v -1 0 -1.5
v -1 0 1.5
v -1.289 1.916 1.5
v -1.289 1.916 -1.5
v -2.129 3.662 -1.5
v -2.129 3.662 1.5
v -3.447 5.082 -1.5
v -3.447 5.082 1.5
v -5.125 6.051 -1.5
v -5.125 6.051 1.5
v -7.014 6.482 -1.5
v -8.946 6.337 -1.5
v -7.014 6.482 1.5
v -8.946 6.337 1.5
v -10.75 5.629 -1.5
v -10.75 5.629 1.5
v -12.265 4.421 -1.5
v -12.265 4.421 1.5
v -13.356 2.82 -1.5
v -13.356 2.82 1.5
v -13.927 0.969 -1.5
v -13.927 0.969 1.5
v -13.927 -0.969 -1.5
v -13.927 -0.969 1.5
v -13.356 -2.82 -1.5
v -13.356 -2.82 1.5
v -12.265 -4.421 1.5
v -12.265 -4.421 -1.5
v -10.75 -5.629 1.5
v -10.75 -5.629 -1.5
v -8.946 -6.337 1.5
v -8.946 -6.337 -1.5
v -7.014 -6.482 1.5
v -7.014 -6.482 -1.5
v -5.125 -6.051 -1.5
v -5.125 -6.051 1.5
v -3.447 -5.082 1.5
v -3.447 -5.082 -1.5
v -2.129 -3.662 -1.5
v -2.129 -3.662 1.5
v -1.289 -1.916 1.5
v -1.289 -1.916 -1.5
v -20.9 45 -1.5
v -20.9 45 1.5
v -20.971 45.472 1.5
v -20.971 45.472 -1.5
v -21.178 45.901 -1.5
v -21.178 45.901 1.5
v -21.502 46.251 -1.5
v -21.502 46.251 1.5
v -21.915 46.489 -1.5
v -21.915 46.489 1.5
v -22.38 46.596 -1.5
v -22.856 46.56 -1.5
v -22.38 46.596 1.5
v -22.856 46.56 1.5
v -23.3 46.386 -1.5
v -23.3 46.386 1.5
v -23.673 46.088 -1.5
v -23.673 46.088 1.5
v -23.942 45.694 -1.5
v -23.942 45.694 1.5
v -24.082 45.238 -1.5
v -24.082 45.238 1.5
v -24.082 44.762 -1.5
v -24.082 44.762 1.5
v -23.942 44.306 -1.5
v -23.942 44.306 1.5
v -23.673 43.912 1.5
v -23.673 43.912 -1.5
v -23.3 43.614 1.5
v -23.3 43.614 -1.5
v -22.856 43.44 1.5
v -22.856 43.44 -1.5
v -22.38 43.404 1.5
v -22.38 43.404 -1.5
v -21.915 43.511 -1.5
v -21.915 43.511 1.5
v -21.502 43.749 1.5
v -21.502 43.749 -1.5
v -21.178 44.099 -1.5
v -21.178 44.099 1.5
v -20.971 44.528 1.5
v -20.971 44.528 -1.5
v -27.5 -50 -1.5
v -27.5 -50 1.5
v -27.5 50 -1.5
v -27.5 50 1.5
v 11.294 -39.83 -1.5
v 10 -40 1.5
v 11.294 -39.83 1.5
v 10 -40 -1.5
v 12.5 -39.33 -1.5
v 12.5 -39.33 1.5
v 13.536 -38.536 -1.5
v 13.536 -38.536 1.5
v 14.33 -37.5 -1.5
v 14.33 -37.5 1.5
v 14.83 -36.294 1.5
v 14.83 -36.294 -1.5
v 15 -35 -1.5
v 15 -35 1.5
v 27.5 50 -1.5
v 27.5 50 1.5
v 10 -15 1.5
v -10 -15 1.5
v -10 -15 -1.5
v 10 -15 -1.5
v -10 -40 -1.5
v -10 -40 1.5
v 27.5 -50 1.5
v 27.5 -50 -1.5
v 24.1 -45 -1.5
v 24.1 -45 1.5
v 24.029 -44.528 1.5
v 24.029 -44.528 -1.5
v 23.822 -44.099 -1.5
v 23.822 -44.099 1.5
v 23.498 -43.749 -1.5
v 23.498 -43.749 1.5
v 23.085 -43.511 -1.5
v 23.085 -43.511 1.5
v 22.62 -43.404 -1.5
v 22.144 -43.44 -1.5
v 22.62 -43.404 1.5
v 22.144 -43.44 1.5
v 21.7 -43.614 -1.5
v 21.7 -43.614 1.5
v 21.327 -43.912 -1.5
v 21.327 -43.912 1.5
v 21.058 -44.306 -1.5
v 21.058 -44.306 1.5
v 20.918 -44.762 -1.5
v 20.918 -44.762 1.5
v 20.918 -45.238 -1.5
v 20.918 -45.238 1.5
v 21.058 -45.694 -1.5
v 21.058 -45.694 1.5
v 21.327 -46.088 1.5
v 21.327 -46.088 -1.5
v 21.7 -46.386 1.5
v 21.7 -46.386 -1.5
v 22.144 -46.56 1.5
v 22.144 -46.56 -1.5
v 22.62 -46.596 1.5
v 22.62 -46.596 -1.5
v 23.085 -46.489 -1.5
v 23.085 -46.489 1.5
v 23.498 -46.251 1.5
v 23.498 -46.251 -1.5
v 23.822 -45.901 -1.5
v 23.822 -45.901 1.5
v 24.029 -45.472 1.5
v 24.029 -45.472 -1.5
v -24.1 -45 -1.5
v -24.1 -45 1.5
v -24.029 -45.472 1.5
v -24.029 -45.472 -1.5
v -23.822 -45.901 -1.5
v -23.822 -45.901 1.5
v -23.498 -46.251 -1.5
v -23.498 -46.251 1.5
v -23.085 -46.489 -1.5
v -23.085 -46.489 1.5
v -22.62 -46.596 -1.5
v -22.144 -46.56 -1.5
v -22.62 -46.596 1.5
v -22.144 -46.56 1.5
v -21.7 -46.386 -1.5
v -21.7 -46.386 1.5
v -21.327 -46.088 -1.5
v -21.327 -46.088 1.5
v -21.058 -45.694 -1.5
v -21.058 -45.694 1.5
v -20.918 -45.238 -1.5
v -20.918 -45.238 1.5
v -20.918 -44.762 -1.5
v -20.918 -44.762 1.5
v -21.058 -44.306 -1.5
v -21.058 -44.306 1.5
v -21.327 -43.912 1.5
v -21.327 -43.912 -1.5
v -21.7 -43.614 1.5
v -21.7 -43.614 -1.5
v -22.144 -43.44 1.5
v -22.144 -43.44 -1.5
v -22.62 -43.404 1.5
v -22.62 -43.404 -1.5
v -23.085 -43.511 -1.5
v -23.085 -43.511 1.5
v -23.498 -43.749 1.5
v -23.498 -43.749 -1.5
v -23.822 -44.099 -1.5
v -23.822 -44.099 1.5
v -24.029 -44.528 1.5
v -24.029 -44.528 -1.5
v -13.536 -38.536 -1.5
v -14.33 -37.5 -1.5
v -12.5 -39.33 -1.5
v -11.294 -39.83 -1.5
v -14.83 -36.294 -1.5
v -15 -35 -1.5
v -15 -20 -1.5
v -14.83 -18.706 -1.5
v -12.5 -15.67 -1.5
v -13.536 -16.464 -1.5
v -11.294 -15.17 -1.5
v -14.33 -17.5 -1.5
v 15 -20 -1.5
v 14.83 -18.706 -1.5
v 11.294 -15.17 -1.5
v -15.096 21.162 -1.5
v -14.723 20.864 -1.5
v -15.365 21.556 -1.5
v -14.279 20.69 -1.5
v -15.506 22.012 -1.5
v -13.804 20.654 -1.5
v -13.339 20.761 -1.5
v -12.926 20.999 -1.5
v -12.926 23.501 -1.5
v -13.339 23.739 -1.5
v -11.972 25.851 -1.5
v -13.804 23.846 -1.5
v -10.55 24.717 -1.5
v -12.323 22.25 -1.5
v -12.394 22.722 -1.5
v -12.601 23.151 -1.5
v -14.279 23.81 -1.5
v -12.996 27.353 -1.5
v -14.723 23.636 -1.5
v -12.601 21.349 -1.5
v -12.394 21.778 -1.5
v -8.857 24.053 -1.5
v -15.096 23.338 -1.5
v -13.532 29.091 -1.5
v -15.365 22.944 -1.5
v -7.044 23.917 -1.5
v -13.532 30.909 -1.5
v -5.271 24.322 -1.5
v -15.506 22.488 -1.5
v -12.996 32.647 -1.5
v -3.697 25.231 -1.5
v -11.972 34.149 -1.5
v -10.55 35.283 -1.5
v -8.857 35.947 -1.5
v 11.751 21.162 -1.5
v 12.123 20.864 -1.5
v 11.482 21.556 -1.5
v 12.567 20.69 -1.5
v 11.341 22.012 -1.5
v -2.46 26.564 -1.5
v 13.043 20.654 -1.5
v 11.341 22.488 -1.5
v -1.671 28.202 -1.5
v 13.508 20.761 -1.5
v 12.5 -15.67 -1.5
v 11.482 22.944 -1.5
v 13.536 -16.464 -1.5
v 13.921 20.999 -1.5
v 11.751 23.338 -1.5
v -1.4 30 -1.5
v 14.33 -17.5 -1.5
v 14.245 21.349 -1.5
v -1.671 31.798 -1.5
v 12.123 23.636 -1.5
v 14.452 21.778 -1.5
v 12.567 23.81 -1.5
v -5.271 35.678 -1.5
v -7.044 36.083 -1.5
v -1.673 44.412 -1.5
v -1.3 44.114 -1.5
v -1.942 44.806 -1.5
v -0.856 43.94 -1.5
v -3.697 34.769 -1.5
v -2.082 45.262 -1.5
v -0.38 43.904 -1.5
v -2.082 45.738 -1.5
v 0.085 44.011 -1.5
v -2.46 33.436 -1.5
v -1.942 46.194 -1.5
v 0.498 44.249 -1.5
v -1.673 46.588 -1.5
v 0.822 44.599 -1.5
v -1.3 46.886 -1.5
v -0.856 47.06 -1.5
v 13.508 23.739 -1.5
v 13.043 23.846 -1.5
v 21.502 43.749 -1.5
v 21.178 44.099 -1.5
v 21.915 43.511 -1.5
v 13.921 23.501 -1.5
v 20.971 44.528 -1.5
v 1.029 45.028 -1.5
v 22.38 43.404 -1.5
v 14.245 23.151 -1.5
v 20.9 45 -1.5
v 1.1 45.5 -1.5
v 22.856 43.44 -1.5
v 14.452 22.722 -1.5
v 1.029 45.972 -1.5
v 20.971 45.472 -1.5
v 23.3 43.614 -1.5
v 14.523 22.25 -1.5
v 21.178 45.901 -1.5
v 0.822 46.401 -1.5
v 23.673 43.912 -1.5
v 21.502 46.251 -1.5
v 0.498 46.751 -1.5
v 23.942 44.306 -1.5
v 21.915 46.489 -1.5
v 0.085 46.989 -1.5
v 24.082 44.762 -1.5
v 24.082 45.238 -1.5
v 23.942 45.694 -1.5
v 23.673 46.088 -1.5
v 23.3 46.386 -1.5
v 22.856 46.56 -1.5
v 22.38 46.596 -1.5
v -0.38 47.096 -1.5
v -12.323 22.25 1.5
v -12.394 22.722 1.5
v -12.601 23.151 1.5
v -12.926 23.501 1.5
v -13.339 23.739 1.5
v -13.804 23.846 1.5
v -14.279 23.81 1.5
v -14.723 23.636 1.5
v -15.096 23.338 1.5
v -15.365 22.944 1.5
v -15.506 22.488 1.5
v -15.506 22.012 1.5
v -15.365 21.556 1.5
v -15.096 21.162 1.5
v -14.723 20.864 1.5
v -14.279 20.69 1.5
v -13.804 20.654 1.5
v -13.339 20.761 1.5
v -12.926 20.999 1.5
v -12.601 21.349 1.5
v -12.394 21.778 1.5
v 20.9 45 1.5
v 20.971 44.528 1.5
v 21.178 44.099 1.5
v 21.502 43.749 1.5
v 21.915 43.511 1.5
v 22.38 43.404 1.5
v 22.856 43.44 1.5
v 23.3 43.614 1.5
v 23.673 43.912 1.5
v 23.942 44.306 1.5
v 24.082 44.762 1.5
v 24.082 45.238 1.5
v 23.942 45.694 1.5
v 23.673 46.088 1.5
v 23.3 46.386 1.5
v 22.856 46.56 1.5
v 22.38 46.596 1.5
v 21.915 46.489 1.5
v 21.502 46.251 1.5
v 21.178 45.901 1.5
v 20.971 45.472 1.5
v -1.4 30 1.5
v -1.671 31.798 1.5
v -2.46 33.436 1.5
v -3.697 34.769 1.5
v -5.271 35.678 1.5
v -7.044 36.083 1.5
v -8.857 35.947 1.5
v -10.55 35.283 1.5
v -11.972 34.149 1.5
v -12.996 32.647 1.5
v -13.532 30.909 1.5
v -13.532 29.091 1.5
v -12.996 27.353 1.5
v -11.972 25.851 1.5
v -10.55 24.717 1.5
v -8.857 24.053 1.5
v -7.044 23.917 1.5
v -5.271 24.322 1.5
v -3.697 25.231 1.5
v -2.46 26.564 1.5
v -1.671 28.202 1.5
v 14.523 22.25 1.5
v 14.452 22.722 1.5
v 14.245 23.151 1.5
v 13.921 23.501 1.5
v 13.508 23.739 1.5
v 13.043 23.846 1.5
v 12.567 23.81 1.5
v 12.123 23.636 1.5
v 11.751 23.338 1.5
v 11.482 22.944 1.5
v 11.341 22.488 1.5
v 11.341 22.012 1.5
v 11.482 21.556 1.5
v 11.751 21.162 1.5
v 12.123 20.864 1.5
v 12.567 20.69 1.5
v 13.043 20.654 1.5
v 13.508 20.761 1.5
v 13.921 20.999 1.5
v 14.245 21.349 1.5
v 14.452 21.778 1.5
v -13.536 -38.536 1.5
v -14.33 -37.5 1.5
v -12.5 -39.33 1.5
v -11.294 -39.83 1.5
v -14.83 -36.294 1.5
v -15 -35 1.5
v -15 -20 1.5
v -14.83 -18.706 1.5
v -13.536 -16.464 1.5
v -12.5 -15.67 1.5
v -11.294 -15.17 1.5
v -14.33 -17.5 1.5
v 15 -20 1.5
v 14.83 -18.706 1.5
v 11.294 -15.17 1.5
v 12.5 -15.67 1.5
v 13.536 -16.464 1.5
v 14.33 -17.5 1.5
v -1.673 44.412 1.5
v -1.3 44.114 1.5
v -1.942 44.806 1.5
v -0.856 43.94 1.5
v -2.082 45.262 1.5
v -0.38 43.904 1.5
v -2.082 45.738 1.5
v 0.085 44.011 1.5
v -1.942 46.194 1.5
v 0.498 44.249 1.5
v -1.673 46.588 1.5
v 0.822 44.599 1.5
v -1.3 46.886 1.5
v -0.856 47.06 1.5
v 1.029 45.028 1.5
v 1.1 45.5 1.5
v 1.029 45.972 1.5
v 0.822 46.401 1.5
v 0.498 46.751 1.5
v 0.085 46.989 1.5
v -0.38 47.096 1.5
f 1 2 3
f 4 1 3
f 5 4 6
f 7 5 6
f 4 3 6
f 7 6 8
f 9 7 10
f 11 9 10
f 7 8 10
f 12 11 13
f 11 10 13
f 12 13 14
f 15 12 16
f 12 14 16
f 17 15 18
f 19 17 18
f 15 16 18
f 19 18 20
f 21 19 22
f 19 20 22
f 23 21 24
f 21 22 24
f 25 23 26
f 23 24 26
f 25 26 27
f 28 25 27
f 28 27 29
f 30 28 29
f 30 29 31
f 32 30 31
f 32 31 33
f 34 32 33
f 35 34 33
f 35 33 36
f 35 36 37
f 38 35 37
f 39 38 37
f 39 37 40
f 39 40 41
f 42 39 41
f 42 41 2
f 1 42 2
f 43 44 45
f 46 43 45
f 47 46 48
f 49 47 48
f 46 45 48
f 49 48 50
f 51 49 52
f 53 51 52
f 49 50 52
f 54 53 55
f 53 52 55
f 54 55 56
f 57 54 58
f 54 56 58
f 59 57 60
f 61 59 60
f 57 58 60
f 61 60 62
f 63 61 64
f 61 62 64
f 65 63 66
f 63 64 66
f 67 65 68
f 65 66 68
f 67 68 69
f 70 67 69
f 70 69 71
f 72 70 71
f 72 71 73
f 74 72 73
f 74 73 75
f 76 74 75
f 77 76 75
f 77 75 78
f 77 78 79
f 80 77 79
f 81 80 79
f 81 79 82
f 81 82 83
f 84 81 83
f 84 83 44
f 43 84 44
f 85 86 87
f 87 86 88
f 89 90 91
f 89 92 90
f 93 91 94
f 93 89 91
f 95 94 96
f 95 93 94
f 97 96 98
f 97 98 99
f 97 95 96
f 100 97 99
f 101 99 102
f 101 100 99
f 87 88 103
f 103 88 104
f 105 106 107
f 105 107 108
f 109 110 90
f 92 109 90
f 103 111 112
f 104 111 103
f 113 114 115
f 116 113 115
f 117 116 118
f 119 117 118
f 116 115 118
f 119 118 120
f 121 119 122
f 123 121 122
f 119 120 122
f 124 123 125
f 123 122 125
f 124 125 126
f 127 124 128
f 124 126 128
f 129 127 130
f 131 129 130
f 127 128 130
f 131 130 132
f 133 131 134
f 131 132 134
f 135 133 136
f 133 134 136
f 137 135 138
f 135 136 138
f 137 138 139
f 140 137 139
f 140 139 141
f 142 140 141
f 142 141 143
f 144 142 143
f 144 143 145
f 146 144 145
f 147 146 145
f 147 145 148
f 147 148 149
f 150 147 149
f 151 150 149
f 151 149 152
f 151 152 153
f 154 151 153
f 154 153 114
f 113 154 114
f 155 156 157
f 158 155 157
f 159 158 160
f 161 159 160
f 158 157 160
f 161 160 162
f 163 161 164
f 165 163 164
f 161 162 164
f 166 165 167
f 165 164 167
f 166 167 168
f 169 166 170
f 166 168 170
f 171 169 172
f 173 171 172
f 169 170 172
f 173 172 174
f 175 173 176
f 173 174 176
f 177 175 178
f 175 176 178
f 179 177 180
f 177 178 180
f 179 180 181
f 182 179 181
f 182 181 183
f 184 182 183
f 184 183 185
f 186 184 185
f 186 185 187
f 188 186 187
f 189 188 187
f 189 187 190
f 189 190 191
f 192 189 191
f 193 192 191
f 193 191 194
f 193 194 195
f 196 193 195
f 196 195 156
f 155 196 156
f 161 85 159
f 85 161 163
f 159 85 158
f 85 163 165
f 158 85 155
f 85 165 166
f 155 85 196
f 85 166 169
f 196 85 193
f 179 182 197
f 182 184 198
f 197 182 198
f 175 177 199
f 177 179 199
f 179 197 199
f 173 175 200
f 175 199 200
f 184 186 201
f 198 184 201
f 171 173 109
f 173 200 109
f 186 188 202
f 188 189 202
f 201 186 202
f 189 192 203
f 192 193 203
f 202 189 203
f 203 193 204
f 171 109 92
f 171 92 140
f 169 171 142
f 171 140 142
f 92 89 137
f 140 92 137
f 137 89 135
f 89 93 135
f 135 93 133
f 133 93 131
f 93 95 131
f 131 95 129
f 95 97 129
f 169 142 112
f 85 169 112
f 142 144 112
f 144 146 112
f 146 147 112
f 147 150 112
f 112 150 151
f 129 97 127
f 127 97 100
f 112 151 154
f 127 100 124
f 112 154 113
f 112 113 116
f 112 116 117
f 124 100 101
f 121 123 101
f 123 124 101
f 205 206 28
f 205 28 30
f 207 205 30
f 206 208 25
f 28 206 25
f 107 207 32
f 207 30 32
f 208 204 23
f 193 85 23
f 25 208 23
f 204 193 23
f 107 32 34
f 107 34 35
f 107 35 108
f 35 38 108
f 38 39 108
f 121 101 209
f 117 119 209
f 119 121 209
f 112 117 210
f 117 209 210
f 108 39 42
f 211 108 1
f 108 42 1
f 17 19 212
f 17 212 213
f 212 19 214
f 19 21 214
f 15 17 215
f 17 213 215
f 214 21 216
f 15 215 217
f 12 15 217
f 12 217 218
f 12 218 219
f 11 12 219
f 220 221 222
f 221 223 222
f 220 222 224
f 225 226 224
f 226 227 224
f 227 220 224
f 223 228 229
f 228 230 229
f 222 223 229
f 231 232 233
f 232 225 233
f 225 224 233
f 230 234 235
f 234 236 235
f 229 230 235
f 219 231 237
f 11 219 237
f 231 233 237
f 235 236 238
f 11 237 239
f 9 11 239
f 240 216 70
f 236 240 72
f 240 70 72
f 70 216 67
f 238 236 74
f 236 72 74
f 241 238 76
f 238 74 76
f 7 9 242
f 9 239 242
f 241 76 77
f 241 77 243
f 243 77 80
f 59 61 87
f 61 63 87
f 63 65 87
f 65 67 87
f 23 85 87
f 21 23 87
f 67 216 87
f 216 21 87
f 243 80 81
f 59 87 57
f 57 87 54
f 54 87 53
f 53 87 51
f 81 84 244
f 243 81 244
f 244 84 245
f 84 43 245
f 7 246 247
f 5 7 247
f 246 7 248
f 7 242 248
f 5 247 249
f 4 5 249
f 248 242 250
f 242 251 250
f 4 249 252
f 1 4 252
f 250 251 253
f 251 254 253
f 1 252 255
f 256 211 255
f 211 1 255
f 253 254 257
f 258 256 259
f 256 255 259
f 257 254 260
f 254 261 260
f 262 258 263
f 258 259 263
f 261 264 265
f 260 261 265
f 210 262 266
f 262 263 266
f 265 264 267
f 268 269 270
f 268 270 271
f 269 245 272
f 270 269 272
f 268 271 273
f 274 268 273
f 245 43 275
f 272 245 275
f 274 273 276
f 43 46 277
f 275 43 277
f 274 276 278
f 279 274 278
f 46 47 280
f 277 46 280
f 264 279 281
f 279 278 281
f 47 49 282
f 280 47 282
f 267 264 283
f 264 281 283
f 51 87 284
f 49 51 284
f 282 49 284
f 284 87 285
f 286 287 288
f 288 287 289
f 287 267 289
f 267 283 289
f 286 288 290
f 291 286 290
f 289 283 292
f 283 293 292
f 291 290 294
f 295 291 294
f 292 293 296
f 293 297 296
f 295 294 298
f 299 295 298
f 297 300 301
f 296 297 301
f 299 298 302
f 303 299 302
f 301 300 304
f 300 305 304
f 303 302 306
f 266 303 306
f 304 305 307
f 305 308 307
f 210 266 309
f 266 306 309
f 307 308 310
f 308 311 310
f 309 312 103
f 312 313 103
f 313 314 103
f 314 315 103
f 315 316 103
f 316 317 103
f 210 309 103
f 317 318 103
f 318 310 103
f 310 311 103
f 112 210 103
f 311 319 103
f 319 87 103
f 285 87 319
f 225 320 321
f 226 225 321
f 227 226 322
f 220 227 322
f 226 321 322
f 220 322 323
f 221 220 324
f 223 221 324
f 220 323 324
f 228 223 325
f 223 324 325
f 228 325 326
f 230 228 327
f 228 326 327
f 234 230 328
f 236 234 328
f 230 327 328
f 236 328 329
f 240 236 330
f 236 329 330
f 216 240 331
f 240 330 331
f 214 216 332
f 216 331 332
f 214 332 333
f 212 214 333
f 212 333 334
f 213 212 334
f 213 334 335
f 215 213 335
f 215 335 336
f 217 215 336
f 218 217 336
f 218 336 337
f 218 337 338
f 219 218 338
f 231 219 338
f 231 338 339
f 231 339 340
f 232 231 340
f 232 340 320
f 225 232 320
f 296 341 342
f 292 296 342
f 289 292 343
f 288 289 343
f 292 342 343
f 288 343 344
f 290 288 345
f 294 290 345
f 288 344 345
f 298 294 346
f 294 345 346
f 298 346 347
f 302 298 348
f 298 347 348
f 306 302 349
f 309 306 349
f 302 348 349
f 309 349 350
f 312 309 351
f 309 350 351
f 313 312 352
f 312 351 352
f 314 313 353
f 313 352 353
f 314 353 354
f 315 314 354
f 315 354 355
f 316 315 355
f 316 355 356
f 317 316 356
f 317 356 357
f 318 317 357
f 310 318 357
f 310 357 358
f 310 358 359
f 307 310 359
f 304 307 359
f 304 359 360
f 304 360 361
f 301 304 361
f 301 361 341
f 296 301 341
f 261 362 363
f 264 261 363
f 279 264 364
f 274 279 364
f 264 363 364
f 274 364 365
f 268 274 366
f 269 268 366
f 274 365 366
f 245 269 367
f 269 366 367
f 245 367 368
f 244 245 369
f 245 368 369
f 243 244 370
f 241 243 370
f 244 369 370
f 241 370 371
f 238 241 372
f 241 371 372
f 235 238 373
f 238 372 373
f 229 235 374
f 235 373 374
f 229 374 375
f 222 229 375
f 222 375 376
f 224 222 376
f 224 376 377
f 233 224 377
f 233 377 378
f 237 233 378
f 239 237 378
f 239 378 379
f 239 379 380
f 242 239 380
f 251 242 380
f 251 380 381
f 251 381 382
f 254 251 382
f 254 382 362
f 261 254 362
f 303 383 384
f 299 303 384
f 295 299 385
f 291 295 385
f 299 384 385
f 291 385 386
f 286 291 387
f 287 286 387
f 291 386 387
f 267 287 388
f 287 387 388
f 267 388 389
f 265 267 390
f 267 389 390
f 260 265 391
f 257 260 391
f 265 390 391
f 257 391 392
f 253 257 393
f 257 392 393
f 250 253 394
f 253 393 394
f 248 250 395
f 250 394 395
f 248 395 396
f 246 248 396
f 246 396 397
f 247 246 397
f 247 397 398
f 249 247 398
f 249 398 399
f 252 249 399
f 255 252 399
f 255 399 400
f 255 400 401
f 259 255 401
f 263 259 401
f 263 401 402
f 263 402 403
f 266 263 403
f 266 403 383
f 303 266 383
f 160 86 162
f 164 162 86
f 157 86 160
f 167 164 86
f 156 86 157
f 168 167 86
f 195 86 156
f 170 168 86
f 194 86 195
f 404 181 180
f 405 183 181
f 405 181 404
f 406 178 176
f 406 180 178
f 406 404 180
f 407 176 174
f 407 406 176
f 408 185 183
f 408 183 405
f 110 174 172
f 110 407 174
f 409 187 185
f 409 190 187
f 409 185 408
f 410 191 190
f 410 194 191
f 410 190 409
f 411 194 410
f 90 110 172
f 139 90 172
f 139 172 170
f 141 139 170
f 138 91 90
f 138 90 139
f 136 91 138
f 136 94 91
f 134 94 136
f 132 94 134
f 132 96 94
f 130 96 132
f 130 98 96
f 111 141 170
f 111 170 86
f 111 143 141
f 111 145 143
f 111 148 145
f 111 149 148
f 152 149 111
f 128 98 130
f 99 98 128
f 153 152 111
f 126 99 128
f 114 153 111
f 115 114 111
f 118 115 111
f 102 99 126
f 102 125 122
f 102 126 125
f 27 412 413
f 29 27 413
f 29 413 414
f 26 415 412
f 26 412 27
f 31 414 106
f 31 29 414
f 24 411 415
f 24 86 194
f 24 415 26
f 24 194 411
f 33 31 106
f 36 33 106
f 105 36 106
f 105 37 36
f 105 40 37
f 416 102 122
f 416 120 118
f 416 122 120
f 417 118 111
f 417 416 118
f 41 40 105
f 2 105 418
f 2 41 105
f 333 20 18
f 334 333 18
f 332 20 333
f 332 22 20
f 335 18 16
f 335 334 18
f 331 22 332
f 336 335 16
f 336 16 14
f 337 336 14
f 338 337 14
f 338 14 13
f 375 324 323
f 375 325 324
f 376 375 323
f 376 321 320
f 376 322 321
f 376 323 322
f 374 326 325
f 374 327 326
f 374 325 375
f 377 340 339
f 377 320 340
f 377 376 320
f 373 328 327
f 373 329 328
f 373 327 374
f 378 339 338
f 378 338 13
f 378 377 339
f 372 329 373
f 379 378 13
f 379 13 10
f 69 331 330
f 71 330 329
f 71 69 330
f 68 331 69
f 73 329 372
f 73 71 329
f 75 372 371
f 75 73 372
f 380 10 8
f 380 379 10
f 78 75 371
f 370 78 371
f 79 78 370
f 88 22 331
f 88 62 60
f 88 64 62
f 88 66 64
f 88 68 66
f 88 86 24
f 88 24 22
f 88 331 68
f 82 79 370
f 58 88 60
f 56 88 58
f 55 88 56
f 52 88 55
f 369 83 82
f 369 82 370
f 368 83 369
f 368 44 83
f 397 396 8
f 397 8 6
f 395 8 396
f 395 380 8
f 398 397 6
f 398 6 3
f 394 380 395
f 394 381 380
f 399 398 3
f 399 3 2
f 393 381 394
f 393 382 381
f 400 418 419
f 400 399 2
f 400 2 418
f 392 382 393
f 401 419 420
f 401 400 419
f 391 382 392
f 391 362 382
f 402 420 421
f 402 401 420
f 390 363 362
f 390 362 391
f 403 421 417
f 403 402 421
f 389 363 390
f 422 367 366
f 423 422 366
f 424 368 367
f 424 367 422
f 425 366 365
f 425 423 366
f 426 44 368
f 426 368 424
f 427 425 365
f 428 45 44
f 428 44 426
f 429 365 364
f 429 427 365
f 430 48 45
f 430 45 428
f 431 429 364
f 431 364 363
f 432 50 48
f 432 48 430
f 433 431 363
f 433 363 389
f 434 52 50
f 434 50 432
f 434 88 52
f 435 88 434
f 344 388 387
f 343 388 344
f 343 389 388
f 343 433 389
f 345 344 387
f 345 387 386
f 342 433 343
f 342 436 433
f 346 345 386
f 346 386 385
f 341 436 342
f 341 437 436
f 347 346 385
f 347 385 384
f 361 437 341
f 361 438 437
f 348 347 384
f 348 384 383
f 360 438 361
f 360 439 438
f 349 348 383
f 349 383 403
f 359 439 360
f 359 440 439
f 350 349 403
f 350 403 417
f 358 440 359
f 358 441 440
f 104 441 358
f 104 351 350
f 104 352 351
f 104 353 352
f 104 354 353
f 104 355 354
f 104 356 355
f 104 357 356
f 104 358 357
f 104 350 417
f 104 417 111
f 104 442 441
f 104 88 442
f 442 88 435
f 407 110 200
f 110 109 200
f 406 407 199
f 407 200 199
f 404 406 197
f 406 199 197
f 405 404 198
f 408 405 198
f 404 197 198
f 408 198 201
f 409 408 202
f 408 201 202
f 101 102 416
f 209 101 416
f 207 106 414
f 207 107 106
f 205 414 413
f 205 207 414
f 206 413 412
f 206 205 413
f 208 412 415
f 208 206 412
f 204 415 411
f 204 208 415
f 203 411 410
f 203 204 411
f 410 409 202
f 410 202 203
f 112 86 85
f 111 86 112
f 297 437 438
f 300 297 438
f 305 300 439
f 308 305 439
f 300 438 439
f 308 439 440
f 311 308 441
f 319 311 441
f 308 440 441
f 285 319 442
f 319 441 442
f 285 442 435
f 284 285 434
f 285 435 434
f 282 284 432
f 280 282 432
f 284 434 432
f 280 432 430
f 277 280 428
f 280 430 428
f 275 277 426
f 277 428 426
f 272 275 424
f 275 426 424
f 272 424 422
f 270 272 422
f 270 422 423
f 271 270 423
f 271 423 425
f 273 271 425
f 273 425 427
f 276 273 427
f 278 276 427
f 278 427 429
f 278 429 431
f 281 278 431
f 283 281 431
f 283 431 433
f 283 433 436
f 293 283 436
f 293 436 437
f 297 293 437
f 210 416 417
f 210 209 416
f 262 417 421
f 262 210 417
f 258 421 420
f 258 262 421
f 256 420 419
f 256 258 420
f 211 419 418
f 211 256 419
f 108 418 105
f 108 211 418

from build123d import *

# Parameters (mm, degrees)
SKETCH_1_W          = 55
SKETCH_1_H          = 100
EXTRUDE_1_DEPTH     = 1.5
SKETCH_2_R          = 6.1
SKETCH_2_R_2        = 6.5
SKETCH_2_R_3        = 1.6
CUT_EXTRUDE_1_DEPTH = 58.142366069
SKETCH_3_R          = 1.6
CUT_EXTRUDE_2_DEPTH = 58.142366069
SKETCH_4_W          = 30
SKETCH_4_H          = 25
CUT_EXTRUDE_3_DEPTH = 58.142366069
FILLET_1_R          = 5


with BuildPart() as part:
    # ｽｹｯﾁ1 → ﾎﾞｽ - 押し出し1 (new, symmetric)
    with BuildSketch(Plane.XY):
        Rectangle(SKETCH_1_W, SKETCH_1_H)
    extrude(amount=EXTRUDE_1_DEPTH, both=True)

    # ｽｹｯﾁ2 → ｶｯﾄ - 押し出し1 (cut, through all)
    with BuildSketch(Plane.XY.offset(1.5)):
        with Locations((-7.5, 30)):
            Circle(SKETCH_2_R)
        with Locations((-7.5, 0)):
            Circle(SKETCH_2_R_2)
        with Locations((12.923393759, 22.25)):
            Circle(SKETCH_2_R_3)
        with Locations((-0.5, 45.5)):
            Circle(SKETCH_2_R_3)
        with Locations((-13.923393759, 22.25)):
            Circle(SKETCH_2_R_3)
    extrude(amount=-CUT_EXTRUDE_1_DEPTH, mode=Mode.SUBTRACT)

    # ｽｹｯﾁ3 → ｶｯﾄ - 押し出し2 (cut, through all)
    with BuildSketch(Plane.XY.offset(1.5)):
        with Locations((-22.5, 45)):
            Circle(SKETCH_3_R)
        with Locations(Location((22.5, 45, 0), (0, 0, 180))):
            Circle(SKETCH_3_R)
        with Locations((22.5, -45)):
            Circle(SKETCH_3_R)
        with Locations(Location((-22.5, -45, 0), (0, 0, 180))):
            Circle(SKETCH_3_R)
    extrude(amount=-CUT_EXTRUDE_2_DEPTH, mode=Mode.SUBTRACT)

    # ｽｹｯﾁ4 → ｶｯﾄ - 押し出し3 (cut, through all)
    with BuildSketch(Plane.XY.offset(1.5)):
        with Locations((0, -27.5)):
            Rectangle(SKETCH_4_W, SKETCH_4_H)
    extrude(amount=-CUT_EXTRUDE_3_DEPTH, mode=Mode.SUBTRACT)

    # ﾌｨﾚｯﾄ1
    fillet_1_edges = [part.edges().sort_by_distance(p)[0] for p in [
        (15, -15, 0),
        (15, -40, 0),
        (-15, -40, 0),
        (-15, -15, 0),
    ]]
    fillet(fillet_1_edges, radius=FILLET_1_R)


solid = part.part
